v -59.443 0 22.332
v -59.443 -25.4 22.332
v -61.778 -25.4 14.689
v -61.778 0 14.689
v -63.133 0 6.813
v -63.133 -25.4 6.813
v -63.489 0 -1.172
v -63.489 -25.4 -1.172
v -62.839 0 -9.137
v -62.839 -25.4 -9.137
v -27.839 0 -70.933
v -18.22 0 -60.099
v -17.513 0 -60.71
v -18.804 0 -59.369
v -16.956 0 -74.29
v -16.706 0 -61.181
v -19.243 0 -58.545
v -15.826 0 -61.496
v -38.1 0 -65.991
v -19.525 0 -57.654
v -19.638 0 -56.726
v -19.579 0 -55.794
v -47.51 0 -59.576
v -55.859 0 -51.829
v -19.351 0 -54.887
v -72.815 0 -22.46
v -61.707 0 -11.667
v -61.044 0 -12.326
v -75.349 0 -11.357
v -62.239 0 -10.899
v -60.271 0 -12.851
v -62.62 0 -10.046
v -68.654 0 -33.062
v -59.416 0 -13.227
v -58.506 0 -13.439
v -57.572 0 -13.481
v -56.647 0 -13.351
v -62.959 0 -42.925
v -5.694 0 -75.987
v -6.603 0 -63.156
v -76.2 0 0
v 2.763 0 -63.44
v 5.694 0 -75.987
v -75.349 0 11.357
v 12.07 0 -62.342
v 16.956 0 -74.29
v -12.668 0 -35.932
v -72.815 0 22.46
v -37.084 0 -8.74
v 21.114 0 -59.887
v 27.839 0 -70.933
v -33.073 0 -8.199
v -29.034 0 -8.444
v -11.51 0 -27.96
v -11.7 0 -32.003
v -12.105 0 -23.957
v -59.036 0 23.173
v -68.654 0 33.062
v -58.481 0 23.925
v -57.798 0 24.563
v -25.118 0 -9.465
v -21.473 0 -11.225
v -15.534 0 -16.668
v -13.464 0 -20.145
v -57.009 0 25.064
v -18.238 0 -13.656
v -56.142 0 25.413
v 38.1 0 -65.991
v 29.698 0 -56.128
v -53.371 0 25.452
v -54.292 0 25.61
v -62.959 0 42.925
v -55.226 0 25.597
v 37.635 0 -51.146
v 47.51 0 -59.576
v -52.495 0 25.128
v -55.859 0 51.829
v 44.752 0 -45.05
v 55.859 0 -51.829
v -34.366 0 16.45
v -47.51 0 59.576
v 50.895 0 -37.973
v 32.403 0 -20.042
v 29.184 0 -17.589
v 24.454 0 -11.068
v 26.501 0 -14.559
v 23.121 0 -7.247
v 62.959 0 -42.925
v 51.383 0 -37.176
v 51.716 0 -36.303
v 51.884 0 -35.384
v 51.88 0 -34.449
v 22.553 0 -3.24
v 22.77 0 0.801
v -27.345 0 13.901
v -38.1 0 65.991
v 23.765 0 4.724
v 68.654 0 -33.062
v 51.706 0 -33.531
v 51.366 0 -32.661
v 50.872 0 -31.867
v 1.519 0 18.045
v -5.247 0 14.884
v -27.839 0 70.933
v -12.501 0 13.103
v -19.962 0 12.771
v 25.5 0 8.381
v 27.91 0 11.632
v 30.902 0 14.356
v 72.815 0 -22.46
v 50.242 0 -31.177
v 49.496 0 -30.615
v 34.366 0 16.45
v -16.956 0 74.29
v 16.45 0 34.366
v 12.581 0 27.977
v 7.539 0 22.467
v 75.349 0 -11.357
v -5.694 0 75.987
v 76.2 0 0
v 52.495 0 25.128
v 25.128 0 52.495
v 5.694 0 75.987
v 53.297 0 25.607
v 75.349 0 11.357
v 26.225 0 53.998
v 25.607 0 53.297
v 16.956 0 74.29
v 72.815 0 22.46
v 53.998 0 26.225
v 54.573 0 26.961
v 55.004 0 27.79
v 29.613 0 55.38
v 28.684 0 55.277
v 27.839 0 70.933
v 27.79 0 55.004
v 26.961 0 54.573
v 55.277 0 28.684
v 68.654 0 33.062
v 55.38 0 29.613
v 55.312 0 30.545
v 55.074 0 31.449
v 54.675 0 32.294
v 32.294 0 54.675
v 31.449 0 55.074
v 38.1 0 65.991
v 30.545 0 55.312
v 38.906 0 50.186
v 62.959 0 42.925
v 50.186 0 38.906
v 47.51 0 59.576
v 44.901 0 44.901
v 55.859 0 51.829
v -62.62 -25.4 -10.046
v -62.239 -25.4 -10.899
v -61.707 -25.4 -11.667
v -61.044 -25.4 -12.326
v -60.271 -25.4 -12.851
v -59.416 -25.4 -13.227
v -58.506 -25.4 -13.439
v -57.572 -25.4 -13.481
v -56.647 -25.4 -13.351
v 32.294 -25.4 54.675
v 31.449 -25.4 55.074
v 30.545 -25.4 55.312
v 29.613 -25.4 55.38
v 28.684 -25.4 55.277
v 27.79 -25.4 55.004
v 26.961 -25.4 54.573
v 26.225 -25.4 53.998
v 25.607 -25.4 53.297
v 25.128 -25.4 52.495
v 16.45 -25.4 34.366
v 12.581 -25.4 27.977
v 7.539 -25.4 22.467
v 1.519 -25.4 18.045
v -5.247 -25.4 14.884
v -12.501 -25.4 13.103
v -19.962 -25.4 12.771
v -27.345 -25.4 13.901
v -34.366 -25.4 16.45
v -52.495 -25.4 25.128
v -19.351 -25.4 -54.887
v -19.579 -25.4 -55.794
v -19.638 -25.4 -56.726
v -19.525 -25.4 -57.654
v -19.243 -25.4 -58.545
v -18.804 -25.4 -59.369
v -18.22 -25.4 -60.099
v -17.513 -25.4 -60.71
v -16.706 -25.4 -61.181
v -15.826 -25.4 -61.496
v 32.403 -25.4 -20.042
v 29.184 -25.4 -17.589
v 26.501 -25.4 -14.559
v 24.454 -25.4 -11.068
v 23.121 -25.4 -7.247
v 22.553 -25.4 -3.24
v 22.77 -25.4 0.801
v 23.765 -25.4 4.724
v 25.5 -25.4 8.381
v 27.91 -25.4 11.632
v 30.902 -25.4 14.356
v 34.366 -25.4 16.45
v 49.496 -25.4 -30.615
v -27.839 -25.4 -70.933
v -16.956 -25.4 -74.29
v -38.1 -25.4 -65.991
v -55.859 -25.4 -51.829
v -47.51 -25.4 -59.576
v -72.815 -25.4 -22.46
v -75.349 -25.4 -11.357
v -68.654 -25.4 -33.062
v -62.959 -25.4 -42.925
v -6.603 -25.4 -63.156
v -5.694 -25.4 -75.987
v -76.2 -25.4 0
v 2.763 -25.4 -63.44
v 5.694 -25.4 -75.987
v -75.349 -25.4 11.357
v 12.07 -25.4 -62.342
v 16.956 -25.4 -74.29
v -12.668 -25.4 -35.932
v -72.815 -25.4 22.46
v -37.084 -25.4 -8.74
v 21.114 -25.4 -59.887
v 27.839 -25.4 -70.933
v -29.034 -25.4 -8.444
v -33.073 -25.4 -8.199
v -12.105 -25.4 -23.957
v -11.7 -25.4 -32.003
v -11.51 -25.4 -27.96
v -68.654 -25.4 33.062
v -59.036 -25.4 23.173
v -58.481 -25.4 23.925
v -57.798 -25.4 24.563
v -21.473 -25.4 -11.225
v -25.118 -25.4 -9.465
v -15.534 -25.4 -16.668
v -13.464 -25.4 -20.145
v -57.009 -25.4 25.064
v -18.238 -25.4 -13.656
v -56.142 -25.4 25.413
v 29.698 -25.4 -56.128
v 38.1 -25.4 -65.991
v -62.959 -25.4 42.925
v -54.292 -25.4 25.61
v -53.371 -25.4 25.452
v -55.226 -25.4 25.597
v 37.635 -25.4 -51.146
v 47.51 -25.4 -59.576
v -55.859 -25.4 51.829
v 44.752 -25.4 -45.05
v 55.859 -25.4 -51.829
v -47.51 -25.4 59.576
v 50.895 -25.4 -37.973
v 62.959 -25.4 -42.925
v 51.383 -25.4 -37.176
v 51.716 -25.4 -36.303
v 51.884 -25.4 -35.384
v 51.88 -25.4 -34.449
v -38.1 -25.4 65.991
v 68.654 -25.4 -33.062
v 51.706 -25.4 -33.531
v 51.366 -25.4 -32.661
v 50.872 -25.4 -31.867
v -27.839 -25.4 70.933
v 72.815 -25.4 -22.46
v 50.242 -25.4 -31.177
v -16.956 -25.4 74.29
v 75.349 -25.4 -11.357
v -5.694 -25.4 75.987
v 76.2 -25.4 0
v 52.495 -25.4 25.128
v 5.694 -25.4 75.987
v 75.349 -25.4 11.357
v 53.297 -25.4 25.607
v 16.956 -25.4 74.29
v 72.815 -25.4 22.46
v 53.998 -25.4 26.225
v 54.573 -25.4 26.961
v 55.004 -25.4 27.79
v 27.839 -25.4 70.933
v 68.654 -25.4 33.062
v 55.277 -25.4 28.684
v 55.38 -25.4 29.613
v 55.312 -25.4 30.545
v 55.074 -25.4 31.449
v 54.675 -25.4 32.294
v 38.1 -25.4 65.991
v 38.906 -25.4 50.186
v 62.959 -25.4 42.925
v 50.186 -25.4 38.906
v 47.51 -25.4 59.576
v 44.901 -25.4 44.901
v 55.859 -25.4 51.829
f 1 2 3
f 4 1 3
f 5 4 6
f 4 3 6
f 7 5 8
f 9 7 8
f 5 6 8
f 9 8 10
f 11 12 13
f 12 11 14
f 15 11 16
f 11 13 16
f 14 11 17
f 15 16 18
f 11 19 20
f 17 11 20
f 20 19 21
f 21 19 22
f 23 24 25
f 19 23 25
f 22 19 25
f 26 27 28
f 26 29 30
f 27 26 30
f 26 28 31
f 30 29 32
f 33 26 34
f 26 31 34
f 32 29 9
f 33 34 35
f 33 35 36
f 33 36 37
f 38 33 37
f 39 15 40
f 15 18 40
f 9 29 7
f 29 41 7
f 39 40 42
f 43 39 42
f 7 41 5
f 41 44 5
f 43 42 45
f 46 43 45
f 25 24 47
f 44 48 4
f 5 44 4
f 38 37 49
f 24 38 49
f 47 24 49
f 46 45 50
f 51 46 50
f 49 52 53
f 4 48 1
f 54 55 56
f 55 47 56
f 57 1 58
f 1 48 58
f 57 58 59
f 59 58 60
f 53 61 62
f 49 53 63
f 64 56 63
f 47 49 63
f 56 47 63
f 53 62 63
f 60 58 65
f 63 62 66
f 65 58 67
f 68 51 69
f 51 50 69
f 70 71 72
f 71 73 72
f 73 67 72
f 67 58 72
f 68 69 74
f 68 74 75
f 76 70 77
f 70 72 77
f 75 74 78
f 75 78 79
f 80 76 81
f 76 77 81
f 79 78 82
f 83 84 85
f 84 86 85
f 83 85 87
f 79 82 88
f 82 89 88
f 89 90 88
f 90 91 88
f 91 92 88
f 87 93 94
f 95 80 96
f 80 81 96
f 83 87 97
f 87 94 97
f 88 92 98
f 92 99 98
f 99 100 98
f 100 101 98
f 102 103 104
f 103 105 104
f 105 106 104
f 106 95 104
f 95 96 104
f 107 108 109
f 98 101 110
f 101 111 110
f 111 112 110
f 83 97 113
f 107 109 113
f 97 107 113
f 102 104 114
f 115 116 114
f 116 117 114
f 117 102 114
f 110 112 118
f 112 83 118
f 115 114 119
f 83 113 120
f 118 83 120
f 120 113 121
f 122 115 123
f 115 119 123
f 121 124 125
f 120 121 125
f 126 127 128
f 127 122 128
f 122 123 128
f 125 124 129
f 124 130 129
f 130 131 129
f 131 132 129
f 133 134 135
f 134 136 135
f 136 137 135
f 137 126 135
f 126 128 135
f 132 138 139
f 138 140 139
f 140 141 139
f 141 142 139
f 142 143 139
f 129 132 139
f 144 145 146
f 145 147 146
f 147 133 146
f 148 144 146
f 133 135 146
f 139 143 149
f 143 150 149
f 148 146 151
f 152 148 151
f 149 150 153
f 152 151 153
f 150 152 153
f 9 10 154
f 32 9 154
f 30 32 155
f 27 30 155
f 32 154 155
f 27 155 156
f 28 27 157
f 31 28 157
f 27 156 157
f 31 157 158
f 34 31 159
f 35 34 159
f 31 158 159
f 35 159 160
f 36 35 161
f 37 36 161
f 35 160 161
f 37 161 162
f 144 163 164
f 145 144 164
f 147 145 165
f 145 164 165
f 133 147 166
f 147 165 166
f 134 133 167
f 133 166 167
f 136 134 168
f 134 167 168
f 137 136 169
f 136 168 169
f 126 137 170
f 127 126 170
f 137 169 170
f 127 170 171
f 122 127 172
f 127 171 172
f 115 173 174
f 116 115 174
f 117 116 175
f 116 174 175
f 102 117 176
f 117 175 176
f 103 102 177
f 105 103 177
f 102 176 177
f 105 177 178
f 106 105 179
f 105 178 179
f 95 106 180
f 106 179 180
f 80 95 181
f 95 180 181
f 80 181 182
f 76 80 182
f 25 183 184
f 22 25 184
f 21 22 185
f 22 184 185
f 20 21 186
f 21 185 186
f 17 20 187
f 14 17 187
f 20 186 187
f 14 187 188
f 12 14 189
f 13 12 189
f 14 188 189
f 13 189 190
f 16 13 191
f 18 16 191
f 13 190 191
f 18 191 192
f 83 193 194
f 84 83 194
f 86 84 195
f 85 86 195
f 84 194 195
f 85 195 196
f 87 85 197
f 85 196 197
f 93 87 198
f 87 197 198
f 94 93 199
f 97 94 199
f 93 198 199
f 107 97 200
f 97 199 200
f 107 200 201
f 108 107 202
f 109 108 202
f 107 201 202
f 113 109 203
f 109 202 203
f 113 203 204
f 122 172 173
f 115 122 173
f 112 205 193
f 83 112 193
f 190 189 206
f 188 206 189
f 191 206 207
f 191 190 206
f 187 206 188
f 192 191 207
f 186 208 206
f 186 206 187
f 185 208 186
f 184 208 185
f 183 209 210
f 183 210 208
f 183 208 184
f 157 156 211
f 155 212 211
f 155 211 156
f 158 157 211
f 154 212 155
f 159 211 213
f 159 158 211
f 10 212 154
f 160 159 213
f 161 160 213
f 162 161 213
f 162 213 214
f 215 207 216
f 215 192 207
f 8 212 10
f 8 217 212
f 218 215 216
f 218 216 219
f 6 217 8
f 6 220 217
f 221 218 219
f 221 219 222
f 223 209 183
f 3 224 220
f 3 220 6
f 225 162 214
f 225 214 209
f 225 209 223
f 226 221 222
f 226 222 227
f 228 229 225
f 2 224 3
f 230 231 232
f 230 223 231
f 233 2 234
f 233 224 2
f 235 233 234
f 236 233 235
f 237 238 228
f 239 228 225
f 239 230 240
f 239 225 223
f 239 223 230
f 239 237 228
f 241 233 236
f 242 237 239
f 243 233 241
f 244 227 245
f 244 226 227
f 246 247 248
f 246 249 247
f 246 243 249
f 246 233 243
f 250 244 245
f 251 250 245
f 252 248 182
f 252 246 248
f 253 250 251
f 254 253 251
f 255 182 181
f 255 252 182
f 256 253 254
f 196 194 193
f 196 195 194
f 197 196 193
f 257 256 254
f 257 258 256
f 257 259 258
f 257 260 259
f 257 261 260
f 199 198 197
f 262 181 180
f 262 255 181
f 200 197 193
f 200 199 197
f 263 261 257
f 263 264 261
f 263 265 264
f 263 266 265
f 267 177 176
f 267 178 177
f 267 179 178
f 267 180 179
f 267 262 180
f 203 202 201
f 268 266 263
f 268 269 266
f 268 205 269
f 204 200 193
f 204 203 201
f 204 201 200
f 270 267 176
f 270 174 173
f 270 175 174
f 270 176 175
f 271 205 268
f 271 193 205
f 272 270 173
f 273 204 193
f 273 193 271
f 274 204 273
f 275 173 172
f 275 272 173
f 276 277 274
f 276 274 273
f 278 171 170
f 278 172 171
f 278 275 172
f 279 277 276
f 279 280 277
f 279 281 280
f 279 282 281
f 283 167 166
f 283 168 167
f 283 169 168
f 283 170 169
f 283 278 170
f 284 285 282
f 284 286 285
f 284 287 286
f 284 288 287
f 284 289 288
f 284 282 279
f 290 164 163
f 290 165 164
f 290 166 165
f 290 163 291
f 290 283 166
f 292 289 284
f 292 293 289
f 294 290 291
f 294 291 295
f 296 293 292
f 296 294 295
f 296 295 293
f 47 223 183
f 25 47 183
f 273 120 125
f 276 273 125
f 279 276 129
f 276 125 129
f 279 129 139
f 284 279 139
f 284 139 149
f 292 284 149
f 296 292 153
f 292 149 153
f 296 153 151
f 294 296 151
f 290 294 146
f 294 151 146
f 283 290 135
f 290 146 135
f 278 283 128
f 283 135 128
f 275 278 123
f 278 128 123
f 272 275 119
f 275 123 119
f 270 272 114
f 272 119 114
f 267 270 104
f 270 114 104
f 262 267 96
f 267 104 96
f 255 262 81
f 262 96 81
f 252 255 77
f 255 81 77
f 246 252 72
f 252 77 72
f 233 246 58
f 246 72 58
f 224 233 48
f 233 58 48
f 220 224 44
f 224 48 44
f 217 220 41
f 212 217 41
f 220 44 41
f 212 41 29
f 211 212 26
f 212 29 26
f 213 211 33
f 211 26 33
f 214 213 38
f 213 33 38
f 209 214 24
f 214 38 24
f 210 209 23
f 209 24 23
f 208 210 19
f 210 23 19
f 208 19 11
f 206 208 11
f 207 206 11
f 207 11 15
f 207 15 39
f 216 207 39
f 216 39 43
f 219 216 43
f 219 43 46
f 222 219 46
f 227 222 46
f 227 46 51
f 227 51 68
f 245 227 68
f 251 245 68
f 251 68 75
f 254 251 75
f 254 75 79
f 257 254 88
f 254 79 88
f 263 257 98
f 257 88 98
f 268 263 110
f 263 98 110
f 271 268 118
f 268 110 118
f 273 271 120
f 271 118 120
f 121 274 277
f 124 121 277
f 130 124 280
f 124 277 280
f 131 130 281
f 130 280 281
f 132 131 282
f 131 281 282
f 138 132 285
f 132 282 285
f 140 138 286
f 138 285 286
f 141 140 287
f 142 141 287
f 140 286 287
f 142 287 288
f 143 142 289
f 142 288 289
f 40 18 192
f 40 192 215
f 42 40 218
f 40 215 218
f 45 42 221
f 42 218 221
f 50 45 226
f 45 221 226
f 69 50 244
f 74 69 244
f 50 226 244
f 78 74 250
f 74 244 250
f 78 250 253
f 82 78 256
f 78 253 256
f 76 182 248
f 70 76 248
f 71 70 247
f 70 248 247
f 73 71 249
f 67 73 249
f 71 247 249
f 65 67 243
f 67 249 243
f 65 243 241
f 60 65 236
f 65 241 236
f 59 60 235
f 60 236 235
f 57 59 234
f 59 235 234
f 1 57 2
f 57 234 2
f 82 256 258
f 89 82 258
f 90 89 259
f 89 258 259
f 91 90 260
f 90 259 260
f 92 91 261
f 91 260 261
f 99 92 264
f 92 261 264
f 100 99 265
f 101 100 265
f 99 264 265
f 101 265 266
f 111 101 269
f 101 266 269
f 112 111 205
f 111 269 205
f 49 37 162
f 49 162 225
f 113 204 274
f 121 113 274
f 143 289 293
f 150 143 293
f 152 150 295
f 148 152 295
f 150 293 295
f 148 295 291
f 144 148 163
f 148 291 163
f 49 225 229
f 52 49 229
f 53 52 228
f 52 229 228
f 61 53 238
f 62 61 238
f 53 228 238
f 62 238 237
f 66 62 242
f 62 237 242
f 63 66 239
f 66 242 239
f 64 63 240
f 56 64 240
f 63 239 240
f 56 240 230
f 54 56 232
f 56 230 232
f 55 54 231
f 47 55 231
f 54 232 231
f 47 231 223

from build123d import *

# Parameters (mm, degrees)
F0_R     = 76.2
F1_DEPTH = 25.4
F3_DEPTH = 25.4


with BuildPart() as f1:
    # F0 (on Front) → F1 (new body)
    with BuildSketch(Plane.XZ):
        Circle(F0_R)
    extrude(amount=F1_DEPTH)

    # F2 (on face) → F3 (cut)
    with BuildSketch(Plane.XZ.offset(25.4)):
        with BuildLine():
            ThreePointArc((16.450121, 34.365732), (-5.247361, 14.883619), (-34.365732, 16.450121))
            Line((-34.365732, 16.450121), (-52.494522, 25.127975))
            ThreePointArc((-52.494522, 25.127975), (-56.583872, 25.258794), (-59.443339, 22.332475))
            ThreePointArc((-59.443339, 22.332475), (-63.133498, 6.812595), (-62.839166, -9.137244))
            ThreePointArc((-62.839166, -9.137244), (-60.6698, -12.606212), (-56.64668, -13.350792))
            Line((-56.64668, -13.350792), (-37.083957, -8.740145))
            ThreePointArc((-37.083957, -8.740145), (-16.812801, -15.096171), (-12.66825, -35.932234))
            Line((-12.66825, -35.932234), (-19.351072, -54.887394))
            ThreePointArc((-19.351072, -54.887394), (-19.04241, -58.967176), (-15.826203, -61.496189))
            ThreePointArc((-15.826203, -61.496189), (21.11375, -59.887057), (50.895007, -37.972993))
            ThreePointArc((50.895007, -37.972993), (51.813965, -33.986089), (49.495687, -30.614816))
            Line((49.495687, -30.614816), (32.402533, -20.042102))
            ThreePointArc((32.402533, -20.042102), (22.56305, -1.213841), (34.365732, 16.450121))
            Line((34.365732, 16.450121), (52.494522, 25.127975))
            ThreePointArc((52.494522, 25.127975), (55.161107, 28.231073), (54.675188, 32.293557))
            ThreePointArc((54.675188, 32.293557), (44.901281, 44.901281), (32.293557, 54.675188))
            ThreePointArc((32.293557, 54.675188), (28.231073, 55.161107), (25.127975, 52.494522))
            Line((25.127975, 52.494522), (16.450121, 34.365732))
        make_face()
    extrude(amount=-F3_DEPTH, mode=Mode.SUBTRACT)


solid = f1.part
